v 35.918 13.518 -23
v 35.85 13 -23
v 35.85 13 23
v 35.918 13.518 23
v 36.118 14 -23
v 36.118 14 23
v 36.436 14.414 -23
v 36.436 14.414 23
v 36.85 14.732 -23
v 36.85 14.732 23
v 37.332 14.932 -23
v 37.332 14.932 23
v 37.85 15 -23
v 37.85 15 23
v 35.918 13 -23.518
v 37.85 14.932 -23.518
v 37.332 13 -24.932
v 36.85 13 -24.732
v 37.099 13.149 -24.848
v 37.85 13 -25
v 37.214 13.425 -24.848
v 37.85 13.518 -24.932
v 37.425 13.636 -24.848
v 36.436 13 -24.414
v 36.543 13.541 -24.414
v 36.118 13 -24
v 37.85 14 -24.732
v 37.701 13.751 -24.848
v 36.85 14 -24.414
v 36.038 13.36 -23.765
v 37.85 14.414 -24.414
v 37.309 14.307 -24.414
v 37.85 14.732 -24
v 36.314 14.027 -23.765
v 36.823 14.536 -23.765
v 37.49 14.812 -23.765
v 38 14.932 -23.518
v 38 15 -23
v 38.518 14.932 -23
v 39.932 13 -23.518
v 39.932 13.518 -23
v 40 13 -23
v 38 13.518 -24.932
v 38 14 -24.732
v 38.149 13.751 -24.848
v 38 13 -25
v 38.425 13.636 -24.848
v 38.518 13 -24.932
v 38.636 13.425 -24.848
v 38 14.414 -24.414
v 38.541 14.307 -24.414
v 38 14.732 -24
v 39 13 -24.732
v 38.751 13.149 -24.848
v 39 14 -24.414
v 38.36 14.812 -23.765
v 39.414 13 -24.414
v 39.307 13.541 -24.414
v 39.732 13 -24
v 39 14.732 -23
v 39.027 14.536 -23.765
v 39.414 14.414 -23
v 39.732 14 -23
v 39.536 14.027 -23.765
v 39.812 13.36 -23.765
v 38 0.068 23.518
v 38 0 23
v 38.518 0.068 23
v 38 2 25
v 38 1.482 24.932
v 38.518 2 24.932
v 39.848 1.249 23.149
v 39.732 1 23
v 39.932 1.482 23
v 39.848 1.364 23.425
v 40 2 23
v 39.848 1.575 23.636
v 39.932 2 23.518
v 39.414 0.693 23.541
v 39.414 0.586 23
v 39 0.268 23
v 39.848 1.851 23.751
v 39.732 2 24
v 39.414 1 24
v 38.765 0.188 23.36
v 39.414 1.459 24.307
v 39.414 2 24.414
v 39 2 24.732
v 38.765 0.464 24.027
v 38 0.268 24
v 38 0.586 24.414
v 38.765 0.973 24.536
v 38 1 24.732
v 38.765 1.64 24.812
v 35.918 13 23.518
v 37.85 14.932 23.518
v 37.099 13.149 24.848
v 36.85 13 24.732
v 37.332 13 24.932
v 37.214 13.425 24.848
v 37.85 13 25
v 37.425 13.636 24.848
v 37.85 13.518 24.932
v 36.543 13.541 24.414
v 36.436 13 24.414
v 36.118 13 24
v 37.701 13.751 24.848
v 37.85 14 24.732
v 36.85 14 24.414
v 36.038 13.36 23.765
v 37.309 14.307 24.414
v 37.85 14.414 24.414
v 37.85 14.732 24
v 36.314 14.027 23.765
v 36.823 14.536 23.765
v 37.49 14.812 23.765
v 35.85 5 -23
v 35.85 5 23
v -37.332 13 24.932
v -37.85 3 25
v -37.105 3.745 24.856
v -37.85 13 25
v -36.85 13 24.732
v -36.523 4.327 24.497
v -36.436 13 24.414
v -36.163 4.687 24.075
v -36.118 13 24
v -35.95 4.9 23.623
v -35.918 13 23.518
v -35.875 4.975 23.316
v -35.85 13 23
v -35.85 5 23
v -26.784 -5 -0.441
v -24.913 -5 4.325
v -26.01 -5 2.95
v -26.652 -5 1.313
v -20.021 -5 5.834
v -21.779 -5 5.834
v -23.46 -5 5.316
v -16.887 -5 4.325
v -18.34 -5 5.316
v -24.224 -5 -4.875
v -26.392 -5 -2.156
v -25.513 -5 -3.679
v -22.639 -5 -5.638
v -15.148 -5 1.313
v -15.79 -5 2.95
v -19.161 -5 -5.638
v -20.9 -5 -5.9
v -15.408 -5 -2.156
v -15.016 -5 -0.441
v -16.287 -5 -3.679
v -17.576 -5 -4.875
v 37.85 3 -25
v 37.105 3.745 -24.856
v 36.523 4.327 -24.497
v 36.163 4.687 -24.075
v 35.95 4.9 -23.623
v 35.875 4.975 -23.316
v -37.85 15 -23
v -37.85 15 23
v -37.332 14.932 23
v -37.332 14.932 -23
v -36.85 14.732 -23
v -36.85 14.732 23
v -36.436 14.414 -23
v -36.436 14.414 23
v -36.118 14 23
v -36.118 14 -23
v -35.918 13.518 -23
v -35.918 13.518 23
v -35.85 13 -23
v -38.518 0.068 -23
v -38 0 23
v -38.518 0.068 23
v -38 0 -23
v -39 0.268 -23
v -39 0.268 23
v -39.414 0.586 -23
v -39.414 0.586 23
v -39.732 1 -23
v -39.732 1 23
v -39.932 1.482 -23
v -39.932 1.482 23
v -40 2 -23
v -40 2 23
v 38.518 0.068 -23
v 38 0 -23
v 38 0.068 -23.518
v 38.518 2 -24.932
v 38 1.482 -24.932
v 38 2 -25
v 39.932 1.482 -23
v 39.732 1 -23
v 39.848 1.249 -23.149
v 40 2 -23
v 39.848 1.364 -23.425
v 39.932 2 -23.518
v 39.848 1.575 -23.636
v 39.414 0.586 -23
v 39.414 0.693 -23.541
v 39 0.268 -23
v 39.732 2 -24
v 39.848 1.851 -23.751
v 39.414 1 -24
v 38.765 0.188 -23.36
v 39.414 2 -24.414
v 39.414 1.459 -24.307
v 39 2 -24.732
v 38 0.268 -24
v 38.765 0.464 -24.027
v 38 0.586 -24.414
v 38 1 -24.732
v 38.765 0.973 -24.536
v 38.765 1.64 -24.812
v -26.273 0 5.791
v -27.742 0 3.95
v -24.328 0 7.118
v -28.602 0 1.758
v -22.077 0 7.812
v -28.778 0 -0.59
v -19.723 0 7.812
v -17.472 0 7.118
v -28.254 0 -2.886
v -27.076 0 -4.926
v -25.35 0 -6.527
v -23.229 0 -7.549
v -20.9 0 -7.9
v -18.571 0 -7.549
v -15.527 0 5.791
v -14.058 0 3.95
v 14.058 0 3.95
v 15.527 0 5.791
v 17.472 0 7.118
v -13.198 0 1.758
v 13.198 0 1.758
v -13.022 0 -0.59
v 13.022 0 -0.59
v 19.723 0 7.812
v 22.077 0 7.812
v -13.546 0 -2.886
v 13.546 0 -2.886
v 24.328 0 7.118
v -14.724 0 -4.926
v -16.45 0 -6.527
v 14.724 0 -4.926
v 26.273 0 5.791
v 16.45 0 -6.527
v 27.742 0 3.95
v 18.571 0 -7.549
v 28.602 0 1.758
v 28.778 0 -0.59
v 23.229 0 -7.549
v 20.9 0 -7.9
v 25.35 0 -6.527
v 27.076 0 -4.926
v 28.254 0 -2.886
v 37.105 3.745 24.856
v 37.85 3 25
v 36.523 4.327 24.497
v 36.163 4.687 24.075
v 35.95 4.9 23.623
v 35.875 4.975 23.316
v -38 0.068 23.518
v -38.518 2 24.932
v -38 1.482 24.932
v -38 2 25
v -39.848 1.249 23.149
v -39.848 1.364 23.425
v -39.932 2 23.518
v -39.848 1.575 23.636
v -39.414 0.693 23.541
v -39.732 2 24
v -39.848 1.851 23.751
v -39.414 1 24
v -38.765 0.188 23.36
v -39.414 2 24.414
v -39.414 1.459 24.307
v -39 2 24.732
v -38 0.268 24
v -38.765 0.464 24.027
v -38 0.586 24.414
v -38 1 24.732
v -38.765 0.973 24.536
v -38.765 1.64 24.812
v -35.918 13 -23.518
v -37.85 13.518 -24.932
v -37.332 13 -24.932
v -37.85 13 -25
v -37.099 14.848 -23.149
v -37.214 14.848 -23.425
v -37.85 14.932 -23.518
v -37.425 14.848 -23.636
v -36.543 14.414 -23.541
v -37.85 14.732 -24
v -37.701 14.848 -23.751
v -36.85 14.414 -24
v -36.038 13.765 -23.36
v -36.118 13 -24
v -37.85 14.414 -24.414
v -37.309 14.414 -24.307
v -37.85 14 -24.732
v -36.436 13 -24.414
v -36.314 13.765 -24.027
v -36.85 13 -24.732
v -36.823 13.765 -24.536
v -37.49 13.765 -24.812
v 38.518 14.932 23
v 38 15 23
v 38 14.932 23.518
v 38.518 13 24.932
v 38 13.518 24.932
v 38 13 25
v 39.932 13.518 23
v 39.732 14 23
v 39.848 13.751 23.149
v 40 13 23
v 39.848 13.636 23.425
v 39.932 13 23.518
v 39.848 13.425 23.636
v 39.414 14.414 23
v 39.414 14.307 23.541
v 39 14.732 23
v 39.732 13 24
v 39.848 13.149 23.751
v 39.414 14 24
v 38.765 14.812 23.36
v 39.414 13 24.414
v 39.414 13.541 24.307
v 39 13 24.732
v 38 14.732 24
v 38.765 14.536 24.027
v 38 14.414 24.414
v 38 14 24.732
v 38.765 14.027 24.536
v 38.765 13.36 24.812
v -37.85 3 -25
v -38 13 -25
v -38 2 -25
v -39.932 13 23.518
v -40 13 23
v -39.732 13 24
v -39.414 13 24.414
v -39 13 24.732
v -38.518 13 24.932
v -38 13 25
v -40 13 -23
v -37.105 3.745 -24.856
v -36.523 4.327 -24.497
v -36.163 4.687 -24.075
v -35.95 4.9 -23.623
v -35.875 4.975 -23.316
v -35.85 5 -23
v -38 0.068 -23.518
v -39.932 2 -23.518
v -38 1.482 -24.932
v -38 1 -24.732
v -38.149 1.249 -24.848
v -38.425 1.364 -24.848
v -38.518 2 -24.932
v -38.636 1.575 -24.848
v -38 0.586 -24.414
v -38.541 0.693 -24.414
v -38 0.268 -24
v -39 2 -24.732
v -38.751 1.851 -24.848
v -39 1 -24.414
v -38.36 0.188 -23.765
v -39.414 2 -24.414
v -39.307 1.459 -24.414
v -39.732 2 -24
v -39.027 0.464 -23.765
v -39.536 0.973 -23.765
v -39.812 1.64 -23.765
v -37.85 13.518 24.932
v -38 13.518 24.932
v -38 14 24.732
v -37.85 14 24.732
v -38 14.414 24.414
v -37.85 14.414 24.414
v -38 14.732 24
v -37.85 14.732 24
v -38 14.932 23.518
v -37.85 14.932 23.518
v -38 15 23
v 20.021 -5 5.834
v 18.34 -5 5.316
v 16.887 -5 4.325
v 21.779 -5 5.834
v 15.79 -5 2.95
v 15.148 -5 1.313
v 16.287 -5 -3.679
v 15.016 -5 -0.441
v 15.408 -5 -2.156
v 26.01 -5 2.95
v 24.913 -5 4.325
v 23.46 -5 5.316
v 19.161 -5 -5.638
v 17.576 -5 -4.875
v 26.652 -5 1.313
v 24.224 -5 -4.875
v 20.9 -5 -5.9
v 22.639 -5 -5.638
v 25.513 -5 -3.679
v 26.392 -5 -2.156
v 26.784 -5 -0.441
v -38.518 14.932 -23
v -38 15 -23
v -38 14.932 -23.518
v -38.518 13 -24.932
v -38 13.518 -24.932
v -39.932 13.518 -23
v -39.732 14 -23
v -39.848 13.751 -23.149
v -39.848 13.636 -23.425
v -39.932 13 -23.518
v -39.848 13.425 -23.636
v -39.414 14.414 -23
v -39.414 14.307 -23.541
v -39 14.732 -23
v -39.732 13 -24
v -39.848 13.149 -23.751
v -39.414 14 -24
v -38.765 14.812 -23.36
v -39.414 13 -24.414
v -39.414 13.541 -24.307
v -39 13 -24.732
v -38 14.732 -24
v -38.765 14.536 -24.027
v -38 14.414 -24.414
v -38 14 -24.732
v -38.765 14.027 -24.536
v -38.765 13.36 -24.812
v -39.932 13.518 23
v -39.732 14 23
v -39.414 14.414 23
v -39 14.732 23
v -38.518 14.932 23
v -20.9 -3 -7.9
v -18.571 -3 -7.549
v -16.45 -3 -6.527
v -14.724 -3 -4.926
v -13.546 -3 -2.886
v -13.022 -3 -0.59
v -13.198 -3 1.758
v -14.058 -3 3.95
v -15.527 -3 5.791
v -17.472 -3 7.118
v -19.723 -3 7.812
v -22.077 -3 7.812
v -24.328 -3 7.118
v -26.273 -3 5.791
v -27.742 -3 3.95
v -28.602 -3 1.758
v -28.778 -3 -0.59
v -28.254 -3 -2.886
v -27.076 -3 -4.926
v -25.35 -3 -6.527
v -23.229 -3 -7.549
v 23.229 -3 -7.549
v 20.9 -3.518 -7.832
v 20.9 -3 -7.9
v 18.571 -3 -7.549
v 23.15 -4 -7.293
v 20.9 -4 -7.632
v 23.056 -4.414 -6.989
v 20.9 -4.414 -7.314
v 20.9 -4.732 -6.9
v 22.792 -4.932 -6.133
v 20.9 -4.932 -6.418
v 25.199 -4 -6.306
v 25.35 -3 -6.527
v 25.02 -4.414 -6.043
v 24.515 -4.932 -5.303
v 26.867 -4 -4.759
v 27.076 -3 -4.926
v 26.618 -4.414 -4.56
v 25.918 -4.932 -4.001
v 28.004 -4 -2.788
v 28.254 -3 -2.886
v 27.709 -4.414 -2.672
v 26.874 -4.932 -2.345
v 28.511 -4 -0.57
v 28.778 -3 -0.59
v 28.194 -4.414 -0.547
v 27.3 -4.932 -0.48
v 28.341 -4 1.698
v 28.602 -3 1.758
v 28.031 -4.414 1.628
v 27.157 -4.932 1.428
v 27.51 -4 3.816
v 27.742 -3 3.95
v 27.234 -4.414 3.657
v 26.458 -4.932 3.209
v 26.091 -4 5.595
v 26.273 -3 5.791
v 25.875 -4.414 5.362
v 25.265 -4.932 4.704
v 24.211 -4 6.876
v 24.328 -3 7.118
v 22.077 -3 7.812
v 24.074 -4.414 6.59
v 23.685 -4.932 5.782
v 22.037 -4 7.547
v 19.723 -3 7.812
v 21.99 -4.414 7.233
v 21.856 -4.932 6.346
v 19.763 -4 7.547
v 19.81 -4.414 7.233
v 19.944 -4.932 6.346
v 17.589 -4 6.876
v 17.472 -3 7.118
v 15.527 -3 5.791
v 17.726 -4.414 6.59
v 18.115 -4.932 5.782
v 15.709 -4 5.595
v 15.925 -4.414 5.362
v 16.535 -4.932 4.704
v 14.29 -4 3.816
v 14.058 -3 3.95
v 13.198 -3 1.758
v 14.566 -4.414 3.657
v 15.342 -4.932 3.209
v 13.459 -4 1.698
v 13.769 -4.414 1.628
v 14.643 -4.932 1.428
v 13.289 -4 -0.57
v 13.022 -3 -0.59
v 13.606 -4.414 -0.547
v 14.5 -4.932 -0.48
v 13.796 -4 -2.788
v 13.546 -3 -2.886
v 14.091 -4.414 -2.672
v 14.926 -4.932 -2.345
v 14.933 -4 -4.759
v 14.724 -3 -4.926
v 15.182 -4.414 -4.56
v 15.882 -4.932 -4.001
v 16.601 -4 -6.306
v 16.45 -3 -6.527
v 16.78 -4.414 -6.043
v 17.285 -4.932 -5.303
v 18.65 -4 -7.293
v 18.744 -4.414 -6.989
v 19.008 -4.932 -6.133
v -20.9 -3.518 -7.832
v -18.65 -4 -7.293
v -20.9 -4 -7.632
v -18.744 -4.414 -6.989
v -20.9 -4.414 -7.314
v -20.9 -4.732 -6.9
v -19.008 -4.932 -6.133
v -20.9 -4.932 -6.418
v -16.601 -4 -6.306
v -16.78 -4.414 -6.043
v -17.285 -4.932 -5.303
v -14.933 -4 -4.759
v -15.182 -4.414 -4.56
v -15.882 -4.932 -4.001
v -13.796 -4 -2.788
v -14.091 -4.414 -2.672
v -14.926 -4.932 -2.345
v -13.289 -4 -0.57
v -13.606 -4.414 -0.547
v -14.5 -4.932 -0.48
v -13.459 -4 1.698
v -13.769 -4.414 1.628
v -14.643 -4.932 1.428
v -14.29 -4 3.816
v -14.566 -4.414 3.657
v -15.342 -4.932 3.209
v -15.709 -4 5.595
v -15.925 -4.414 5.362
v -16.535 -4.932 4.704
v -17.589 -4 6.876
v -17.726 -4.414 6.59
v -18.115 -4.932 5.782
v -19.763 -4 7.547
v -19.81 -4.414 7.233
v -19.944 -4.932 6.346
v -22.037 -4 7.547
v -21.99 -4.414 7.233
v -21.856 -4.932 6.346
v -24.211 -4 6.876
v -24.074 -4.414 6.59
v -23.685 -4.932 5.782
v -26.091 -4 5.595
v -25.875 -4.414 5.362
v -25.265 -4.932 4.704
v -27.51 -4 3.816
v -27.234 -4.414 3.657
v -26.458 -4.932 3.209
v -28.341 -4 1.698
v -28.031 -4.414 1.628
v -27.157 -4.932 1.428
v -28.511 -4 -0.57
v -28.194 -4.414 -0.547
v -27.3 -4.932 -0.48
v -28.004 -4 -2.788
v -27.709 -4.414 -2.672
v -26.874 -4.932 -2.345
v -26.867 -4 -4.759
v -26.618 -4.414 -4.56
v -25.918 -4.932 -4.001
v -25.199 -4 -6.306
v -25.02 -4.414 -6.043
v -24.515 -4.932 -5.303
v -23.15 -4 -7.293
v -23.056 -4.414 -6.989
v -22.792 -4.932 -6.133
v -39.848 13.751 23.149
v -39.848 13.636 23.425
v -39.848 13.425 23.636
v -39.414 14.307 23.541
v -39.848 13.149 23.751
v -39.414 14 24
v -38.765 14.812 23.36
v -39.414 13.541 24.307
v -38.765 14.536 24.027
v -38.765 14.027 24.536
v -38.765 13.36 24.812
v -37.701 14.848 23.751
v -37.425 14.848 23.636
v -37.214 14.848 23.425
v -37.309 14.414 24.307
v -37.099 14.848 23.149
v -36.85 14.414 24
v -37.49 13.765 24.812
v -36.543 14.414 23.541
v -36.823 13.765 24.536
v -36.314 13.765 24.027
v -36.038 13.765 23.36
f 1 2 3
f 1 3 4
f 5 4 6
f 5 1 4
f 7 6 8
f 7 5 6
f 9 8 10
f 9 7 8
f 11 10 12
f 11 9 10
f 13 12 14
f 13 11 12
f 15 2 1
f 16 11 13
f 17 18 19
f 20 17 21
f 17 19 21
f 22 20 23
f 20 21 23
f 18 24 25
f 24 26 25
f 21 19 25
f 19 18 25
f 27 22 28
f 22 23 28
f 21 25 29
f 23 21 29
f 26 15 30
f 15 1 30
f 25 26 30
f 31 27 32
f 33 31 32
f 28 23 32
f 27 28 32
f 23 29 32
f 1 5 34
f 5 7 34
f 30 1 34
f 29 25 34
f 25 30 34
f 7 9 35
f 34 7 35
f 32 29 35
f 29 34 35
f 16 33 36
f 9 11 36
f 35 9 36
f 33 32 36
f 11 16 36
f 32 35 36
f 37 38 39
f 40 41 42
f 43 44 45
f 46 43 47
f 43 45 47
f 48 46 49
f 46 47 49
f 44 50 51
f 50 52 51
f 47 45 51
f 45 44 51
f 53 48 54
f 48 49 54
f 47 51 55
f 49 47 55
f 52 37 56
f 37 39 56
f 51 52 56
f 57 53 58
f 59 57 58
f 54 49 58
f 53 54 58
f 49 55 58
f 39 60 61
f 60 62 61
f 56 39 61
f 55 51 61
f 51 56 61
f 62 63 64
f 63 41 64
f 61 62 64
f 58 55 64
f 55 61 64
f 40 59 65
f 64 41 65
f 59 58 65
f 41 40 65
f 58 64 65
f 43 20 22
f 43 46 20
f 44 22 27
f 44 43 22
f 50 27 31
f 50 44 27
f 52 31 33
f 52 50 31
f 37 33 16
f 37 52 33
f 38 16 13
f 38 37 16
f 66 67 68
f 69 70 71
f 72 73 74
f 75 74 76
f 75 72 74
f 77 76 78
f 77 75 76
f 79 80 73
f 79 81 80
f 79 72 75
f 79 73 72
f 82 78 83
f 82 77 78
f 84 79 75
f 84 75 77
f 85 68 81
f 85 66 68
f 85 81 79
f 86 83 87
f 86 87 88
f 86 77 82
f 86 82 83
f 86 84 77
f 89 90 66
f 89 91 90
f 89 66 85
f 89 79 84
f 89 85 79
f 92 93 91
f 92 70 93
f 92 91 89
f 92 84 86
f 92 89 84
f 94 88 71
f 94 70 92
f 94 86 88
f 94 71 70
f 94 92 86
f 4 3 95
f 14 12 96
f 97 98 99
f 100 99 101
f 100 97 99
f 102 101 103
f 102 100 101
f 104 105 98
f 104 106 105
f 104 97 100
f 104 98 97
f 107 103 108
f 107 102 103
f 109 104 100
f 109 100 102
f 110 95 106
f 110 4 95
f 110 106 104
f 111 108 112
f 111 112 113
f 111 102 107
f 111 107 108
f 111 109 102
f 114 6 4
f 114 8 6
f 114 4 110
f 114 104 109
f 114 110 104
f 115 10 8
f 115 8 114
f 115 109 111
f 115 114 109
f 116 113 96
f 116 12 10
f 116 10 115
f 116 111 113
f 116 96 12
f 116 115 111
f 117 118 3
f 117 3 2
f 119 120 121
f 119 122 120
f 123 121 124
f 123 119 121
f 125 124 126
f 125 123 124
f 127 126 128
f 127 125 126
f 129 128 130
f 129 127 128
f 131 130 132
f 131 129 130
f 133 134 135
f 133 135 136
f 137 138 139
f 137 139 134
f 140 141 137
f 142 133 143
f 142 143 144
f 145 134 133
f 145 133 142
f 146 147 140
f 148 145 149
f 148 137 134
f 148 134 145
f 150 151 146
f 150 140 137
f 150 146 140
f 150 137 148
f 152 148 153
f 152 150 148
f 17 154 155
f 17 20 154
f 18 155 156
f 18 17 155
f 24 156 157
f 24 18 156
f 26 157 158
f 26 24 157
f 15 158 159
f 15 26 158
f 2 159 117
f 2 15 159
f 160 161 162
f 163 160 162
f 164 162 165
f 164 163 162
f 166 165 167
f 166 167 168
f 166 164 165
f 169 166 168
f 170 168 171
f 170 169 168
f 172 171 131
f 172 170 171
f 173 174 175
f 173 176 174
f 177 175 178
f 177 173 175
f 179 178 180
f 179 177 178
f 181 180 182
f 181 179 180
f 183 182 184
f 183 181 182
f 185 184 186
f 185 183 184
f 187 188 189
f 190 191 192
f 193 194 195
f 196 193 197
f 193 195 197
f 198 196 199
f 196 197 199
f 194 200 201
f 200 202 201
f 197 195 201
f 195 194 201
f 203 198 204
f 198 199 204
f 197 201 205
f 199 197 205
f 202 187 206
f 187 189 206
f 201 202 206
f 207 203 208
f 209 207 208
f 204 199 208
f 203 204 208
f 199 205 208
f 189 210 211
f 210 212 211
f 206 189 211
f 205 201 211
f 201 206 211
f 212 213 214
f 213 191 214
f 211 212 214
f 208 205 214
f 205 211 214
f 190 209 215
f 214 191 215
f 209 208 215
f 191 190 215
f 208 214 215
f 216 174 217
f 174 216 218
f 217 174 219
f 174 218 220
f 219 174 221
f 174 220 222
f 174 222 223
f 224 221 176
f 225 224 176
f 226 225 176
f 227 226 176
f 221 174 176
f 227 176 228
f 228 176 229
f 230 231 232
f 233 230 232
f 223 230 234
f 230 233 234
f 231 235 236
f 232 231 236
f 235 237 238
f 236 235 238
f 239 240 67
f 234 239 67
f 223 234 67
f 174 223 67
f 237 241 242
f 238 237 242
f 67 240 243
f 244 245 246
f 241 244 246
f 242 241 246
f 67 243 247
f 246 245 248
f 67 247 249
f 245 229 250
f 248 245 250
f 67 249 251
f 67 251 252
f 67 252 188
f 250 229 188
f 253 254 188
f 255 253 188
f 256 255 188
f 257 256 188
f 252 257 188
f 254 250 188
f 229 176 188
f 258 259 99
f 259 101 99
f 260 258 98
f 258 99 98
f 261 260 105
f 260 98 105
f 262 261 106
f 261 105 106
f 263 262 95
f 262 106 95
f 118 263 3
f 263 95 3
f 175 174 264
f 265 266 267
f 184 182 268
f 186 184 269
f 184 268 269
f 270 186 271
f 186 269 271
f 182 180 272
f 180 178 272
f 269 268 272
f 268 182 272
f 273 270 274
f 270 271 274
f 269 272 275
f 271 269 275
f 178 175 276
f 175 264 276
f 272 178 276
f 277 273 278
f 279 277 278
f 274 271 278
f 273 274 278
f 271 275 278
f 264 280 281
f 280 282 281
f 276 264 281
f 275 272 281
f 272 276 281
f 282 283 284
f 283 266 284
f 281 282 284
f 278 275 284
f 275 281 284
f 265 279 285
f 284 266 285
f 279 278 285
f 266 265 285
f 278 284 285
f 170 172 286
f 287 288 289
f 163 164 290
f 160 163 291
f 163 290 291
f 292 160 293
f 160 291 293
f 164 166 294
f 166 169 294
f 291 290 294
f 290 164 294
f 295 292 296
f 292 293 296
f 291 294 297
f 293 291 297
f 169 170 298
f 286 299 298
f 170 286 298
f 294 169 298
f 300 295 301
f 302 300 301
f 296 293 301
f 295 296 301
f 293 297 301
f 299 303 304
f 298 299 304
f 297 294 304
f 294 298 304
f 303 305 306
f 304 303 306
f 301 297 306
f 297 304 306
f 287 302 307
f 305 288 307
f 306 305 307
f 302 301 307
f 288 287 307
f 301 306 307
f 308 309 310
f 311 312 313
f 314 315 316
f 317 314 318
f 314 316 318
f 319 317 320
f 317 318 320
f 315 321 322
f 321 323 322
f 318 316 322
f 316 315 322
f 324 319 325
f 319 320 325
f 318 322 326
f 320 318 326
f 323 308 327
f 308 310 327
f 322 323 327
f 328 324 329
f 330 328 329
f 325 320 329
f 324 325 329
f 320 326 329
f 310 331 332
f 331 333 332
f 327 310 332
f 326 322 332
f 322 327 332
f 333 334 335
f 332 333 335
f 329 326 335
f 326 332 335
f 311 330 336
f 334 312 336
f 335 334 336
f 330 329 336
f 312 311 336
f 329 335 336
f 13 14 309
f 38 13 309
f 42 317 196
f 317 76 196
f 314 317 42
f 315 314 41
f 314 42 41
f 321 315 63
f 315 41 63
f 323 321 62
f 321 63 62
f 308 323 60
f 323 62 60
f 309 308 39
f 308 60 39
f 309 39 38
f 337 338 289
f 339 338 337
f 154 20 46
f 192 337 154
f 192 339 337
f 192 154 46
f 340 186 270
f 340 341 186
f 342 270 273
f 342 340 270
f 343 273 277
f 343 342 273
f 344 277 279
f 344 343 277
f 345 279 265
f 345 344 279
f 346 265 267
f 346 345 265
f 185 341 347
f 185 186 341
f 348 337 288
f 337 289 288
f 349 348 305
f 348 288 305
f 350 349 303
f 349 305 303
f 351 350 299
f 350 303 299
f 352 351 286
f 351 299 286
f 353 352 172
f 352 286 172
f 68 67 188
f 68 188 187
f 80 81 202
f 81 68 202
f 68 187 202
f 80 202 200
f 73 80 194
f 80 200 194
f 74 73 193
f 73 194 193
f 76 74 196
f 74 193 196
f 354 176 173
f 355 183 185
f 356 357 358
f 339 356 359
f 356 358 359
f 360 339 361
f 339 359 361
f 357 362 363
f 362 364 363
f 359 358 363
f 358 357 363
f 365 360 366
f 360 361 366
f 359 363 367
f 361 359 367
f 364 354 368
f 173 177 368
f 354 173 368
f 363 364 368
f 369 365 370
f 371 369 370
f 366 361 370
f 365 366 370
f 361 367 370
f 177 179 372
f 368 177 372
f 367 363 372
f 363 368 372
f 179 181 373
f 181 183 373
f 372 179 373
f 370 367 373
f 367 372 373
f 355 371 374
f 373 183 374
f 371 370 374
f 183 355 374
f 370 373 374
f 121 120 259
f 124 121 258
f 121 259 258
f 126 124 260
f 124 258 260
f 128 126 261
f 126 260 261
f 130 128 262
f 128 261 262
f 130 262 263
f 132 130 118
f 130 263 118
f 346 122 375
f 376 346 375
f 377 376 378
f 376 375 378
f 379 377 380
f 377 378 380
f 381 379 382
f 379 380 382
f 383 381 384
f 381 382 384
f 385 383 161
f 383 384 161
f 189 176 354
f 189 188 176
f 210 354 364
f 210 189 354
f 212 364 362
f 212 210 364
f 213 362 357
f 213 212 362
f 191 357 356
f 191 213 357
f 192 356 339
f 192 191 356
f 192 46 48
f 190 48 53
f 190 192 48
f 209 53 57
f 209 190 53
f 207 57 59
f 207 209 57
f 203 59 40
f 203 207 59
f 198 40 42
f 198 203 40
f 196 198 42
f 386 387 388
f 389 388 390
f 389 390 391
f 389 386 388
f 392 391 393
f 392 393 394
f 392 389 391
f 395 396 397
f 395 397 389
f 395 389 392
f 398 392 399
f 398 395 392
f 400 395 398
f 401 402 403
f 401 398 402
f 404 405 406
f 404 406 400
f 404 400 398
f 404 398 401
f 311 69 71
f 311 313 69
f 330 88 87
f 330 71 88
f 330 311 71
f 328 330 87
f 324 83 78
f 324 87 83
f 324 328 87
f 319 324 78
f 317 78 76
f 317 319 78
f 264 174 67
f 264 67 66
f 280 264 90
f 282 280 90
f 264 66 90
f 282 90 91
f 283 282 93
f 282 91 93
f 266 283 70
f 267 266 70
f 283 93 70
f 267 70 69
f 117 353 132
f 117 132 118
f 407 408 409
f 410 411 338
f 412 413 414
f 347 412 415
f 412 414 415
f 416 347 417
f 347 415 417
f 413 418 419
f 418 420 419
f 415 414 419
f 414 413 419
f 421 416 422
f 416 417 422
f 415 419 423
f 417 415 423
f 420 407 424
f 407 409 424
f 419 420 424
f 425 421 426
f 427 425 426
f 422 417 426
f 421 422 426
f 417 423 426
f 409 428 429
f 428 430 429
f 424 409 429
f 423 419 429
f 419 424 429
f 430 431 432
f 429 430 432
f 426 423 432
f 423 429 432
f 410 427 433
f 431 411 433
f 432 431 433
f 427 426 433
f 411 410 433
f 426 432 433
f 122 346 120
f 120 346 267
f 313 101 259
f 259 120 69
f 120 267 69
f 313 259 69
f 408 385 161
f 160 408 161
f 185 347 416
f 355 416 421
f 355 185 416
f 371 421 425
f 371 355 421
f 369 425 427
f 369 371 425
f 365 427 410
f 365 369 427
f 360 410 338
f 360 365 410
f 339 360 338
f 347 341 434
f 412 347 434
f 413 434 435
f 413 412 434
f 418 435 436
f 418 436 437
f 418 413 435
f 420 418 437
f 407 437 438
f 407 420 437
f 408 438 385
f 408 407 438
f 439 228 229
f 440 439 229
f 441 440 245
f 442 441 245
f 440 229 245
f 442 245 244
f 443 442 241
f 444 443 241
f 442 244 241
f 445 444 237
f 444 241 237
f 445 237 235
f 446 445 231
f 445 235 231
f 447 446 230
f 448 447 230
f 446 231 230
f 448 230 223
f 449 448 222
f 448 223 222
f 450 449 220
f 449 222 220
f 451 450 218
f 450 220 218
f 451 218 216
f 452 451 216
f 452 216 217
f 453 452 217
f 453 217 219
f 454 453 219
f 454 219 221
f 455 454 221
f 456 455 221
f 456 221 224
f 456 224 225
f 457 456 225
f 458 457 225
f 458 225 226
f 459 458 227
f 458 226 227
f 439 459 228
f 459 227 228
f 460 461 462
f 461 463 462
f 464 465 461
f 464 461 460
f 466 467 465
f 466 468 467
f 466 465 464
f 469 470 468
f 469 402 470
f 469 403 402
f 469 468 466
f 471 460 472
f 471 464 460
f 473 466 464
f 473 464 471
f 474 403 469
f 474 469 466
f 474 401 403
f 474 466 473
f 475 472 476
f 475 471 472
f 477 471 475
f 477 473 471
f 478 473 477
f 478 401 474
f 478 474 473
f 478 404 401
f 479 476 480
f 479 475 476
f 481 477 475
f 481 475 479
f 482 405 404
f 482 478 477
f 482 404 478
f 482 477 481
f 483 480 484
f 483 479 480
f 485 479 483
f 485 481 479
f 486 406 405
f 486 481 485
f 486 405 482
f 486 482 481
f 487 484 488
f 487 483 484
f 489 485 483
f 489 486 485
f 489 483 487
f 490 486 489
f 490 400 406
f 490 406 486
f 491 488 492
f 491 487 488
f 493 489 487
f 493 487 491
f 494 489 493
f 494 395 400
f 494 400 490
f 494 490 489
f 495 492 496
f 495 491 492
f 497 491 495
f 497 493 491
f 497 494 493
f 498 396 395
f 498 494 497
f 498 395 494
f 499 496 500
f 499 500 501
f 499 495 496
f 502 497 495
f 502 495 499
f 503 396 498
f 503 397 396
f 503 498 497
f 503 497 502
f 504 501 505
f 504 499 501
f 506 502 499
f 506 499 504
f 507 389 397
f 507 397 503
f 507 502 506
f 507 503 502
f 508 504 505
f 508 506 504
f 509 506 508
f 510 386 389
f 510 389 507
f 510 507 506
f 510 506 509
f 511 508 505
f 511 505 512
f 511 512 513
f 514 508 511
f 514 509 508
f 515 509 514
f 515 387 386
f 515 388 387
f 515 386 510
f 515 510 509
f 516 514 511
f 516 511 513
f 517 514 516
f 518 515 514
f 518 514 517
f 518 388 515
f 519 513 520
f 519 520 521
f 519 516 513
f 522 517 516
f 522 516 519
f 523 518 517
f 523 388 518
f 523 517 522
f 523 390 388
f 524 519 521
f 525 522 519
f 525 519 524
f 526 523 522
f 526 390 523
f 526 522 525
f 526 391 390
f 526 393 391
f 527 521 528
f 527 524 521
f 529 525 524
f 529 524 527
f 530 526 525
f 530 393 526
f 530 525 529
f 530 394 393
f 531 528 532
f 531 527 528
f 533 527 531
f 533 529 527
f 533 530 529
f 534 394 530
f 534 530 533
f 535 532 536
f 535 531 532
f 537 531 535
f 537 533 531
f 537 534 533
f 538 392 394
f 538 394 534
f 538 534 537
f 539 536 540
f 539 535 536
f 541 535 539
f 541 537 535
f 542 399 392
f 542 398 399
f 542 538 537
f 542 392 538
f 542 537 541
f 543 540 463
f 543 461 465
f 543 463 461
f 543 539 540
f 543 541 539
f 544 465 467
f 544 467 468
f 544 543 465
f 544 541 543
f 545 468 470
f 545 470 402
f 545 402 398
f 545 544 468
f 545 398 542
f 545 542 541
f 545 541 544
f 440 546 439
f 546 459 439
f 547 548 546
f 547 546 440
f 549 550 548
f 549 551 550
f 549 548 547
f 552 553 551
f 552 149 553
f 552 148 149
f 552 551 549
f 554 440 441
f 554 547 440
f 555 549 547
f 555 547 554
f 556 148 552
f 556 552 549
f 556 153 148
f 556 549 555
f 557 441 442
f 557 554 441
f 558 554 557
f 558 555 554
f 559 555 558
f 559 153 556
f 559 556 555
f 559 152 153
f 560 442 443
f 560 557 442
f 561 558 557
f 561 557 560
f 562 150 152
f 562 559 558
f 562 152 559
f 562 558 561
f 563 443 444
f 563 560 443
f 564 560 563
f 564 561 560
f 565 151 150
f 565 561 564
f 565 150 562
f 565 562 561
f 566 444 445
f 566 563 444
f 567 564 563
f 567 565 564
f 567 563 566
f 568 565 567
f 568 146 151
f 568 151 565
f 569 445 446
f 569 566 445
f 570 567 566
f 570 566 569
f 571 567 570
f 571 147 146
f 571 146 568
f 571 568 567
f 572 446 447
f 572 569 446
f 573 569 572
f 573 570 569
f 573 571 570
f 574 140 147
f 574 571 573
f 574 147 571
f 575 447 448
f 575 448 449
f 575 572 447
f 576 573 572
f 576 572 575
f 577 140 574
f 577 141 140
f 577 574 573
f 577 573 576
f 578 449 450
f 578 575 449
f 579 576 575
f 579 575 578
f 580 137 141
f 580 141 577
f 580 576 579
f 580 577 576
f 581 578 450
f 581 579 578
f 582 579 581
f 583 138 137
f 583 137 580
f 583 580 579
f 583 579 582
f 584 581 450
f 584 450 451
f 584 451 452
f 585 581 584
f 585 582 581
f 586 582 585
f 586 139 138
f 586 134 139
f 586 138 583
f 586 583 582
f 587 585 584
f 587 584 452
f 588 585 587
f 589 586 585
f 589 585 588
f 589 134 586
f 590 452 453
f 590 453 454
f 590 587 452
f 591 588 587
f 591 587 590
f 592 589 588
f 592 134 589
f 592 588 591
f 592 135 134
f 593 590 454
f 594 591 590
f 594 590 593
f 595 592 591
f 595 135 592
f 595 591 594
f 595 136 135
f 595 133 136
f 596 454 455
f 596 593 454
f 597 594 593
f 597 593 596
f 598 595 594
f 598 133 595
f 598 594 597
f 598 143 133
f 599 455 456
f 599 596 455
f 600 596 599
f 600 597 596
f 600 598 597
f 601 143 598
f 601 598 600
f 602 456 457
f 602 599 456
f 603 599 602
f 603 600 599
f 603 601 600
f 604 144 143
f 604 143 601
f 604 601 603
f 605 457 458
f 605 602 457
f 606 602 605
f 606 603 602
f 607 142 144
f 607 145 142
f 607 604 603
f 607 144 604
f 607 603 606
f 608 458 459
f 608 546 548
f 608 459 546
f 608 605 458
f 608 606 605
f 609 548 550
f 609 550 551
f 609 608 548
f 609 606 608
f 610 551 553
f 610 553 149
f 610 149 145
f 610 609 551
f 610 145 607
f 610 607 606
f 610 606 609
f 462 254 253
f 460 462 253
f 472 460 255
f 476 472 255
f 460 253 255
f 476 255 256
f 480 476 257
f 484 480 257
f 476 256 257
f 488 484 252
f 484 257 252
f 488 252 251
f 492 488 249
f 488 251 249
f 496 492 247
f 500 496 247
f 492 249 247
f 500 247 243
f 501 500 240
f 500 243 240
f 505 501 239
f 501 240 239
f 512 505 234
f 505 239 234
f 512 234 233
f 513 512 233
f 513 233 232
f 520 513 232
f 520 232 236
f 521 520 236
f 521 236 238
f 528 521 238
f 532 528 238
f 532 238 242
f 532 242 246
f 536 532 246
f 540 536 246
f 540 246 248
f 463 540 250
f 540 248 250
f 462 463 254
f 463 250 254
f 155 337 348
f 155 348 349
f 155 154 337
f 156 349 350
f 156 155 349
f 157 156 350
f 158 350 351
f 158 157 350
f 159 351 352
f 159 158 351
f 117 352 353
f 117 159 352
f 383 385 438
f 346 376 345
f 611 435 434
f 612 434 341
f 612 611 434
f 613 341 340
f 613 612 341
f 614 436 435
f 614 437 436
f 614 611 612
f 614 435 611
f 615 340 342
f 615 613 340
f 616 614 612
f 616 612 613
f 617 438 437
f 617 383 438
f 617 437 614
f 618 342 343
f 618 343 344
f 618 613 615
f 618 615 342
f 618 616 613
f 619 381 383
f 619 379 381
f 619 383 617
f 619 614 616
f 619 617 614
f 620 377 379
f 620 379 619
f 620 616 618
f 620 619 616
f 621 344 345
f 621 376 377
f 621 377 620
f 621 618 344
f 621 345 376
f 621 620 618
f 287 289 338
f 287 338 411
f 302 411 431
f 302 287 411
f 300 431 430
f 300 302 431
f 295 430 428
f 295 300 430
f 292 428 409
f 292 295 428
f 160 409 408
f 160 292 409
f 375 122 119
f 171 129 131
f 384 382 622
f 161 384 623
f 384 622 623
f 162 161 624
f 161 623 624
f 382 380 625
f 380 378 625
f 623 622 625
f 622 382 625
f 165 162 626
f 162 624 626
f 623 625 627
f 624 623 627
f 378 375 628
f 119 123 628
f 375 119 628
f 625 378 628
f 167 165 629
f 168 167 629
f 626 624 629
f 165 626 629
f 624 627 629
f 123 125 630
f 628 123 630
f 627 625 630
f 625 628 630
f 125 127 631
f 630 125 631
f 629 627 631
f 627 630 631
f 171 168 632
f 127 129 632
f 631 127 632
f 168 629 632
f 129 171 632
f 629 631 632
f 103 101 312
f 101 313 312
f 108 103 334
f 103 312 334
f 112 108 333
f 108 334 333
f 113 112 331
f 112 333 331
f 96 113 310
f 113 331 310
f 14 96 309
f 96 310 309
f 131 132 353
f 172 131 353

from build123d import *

# Parameters (mm, degrees)
SKETCH1_W           = 80
SKETCH1_H           = 50
BOSS_EXTRUDE1_DEPTH = 5
SKETCH2_R           = 7.9
BOSS_EXTRUDE2_DEPTH = 5
SKETCH3_W           = 4.15
SKETCH3_H           = 50
BOSS_EXTRUDE3_DEPTH = 10
FILLET1_R           = 2
FILLET2_R           = 2


with BuildPart() as part:
    # Sketch1 → Boss-Extrude1 (new body)
    with BuildSketch(Plane(origin=(0, 0, 0), x_dir=(1, 0, 0), z_dir=(0, 1, 0))):
        Rectangle(SKETCH1_W, SKETCH1_H)
    extrude(amount=BOSS_EXTRUDE1_DEPTH)

    # Sketch2 → Boss-Extrude2 (add)
    with BuildSketch(Plane.XZ):
        with Locations(Location((-20.9, 0, 0), (0, 0, 270))):
            Circle(SKETCH2_R)
        with Locations(Location((20.9, 0, 0), (0, 0, 270))):
            Circle(SKETCH2_R)
    extrude(amount=BOSS_EXTRUDE2_DEPTH)

    # Sketch3 → Boss-Extrude3 (add)
    with BuildSketch(Plane(origin=(0, 5, 0), x_dir=(1, 0, 0), z_dir=(0, 1, 0))):
        with Locations((-37.925, 0)):
            Rectangle(SKETCH3_W, SKETCH3_H)
        with Locations((37.925, 0)):
            Rectangle(SKETCH3_W, SKETCH3_H)
    extrude(amount=BOSS_EXTRUDE3_DEPTH)

    # Fillet1
    fillet1_edges = [part.edges().sort_by_distance(p)[0] for p in [
        (-20.9, -5, 7.9),
        (20.9, -5, 7.9),
    ]]
    fillet(fillet1_edges, radius=FILLET1_R)

    # Fillet2
    fillet2_edges = [part.edges().sort_by_distance(p)[0] for p in [
        (0, 5, 25),
        (-35.85, 10, 25),
        (-35.85, 10, -25),
        (-37.925, 15, 25),
        (-35.85, 15, 0),
        (-37.925, 15, -25),
        (-40, 15, 0),
        (0, 5, -25),
        (35.85, 15, 0),
        (35.85, 10, -25),
        (35.85, 10, 25),
        (37.925, 15, 25),
        (40, 15, 0),
        (37.925, 15, -25),
        (0, 0, 25),
        (-40, 0, 0),
        (0, 0, -25),
        (40, 0, 0),
        (40, 7.5, 25),
        (-40, 7.5, 25),
        (-40, 7.5, -25),
        (40, 7.5, -25),
    ]]
    fillet(fillet2_edges, radius=FILLET2_R)


solid = part.part
